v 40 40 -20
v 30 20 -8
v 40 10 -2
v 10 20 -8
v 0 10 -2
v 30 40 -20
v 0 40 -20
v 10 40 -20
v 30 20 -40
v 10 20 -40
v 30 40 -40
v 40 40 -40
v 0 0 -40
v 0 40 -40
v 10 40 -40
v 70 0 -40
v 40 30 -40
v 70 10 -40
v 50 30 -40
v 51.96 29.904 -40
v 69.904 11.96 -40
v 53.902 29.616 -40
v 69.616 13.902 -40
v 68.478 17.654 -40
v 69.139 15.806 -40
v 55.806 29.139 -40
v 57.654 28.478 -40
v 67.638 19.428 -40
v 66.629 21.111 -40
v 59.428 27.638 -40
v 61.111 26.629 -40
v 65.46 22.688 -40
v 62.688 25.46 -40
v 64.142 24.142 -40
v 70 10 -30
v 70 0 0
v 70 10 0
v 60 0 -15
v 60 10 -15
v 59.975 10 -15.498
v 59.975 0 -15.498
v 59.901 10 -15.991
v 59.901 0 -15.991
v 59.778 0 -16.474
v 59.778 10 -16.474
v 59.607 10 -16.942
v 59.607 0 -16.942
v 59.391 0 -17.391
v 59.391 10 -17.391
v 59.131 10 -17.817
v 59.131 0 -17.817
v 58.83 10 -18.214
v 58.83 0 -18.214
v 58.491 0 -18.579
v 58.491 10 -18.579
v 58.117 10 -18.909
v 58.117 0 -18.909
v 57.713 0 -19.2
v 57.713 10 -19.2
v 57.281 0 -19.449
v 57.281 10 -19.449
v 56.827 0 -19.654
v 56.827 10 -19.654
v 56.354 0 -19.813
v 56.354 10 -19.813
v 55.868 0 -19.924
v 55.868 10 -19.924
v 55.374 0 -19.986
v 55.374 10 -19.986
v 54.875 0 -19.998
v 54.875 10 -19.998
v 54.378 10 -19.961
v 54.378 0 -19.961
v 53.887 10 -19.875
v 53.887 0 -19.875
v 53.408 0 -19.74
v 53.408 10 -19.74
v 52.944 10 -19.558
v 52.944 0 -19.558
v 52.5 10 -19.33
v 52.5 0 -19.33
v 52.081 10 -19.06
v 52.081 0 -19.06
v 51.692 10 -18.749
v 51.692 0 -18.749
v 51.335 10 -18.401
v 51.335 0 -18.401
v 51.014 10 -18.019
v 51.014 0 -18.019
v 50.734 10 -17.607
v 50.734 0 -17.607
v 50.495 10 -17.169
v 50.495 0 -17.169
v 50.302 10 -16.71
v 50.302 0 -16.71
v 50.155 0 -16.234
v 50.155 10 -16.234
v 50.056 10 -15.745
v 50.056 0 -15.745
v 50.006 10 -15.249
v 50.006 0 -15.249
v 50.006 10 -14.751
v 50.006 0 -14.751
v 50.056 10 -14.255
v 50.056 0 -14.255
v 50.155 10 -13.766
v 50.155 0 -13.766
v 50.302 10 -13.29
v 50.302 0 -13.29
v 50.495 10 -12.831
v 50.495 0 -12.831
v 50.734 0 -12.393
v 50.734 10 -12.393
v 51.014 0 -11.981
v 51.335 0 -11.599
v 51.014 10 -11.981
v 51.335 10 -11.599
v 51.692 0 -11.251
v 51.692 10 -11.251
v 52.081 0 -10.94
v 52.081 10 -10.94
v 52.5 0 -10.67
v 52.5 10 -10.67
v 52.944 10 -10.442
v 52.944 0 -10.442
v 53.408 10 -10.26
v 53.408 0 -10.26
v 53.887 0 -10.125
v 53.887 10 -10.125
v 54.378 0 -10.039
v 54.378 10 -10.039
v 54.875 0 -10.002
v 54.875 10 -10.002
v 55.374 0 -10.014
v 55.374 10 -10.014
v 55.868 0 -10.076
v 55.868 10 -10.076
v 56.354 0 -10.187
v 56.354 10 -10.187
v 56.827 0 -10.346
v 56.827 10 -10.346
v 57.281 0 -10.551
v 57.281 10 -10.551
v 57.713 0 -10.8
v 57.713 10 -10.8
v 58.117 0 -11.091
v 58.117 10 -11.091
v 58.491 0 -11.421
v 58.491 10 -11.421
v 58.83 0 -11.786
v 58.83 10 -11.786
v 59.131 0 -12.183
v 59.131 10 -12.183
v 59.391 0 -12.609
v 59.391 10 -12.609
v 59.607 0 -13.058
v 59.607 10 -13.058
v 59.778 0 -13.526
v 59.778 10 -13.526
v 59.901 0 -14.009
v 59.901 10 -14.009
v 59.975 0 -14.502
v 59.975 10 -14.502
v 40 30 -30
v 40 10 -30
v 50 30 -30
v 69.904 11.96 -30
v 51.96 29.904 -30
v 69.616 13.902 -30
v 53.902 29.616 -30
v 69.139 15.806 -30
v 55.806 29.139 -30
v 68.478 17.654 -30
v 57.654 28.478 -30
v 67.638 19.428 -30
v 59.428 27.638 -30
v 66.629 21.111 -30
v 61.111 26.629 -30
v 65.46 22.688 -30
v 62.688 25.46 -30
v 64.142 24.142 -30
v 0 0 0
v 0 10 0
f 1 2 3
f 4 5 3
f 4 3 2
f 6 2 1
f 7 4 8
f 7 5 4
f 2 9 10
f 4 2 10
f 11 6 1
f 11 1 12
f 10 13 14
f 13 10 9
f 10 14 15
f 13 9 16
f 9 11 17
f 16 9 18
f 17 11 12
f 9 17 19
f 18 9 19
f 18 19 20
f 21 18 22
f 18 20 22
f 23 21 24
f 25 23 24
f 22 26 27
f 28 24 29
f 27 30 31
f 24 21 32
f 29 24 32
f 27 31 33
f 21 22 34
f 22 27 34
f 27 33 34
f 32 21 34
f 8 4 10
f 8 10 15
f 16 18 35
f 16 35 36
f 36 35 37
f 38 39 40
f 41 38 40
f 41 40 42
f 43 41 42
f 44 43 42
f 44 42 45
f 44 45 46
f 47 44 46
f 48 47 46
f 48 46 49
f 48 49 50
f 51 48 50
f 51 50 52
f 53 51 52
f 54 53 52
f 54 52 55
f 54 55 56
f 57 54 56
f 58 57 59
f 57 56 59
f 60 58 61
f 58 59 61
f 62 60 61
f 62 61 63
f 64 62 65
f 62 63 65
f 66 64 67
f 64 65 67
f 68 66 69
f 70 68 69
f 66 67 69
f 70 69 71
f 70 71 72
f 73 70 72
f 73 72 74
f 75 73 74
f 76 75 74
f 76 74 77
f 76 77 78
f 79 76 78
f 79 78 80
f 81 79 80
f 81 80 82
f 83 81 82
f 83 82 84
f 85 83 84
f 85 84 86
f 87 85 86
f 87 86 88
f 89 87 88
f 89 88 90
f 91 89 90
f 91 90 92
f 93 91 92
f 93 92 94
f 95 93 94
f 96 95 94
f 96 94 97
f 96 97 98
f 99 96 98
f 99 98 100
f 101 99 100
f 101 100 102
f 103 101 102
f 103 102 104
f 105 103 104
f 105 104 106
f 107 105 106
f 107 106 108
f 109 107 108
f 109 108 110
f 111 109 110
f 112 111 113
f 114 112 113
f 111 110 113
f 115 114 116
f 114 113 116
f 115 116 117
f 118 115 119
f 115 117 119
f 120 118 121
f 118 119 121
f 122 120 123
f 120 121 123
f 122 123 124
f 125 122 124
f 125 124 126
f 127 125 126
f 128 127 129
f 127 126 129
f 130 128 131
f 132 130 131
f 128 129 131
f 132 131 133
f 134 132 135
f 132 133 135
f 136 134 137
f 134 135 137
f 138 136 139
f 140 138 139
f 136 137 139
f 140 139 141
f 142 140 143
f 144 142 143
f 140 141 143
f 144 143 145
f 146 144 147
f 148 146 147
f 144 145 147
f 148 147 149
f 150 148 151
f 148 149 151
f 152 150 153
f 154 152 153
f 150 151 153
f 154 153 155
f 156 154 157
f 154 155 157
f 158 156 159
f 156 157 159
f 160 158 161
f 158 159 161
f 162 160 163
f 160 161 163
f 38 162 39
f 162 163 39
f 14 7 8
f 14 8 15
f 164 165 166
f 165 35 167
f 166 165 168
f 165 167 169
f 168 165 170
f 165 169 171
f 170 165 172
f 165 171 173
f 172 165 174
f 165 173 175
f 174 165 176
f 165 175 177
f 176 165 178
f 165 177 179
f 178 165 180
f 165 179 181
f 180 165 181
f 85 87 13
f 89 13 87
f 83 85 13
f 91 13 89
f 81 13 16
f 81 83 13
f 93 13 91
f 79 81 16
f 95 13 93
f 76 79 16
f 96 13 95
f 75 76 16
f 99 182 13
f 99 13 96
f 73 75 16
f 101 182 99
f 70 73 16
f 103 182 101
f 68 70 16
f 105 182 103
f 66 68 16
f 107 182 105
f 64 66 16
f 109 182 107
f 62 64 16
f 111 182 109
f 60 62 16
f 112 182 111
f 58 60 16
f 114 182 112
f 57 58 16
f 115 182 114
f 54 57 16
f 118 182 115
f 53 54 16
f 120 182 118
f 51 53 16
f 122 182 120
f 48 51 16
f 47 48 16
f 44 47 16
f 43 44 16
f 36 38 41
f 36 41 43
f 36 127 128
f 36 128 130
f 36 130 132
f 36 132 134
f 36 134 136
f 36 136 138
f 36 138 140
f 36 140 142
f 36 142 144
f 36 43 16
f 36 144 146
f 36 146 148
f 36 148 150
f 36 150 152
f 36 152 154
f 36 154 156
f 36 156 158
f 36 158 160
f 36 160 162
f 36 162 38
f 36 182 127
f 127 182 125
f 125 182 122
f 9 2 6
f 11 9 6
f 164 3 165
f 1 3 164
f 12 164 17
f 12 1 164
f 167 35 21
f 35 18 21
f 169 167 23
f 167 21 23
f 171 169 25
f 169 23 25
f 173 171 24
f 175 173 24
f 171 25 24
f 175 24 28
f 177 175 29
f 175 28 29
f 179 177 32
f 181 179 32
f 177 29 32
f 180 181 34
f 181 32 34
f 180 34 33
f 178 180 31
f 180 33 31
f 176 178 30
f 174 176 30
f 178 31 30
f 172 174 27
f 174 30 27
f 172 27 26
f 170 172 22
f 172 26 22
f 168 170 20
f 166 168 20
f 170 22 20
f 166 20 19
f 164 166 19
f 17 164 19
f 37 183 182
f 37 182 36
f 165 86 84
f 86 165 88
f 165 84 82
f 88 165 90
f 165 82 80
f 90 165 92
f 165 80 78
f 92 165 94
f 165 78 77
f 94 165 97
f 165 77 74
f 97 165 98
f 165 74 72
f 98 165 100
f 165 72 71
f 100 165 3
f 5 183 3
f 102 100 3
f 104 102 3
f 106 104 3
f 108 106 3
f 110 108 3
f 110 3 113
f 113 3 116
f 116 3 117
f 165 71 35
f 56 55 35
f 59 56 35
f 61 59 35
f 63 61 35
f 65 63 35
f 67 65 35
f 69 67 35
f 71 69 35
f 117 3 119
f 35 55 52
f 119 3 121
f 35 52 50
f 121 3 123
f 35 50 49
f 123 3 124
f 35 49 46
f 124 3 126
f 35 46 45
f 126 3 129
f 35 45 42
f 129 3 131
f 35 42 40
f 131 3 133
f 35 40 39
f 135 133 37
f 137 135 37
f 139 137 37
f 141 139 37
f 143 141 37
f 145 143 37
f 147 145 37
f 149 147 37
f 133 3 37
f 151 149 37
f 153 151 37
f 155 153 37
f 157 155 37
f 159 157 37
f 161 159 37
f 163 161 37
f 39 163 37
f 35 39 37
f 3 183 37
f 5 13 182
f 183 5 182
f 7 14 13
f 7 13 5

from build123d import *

# Parameters (mm, degrees)
BOSS_EXTRUDE1_DEPTH            = 40
SKETCH2_W                      = 40
SKETCH2_H                      = 30
BOSS_EXTRUDE2_DEPTH            = 20
BOSS_EXTRUDE3_DEPTH            = 30
CUT_EXTRUDE1_DEPTH             = 30
SKETCH5_W                      = 70
SKETCH5_H                      = 40
BOSS_EXTRUDE4_DEPTH            = 10
SKETCH6_W                      = 20
SKETCH6_H                      = 20
CUT_EXTRUDE2_DEPTH             = 41
F_10_0_10_DIAMETER_HOLE1_D     = 10
F_10_0_10_DIAMETER_HOLE1_DEPTH = 40
FILLET1_R                      = 20


with BuildPart() as part:
    # Sketch1 → Boss-Extrude1 (new body)
    with BuildSketch(Plane(origin=(0, 0, 0), x_dir=(0, -1, 0), z_dir=(-1, 0, 0))):
        Polygon((-10, -2), (-40, -20), (-10, -20), align=None)
    extrude(amount=-BOSS_EXTRUDE1_DEPTH)

    # Sketch2 → Boss-Extrude2 (add)
    with BuildSketch(Plane(origin=(0, 0, -20), x_dir=(-1, 0, 0), z_dir=(0, 0, -1))):
        with Locations((-20, 25)):
            Rectangle(SKETCH2_W, SKETCH2_H)
    extrude(amount=BOSS_EXTRUDE2_DEPTH)

    # Sketch3 → Boss-Extrude3 (add)
    with BuildSketch(Plane(origin=(40, 0, 0), x_dir=(0, 0, -1), z_dir=(1, 0, 0))):
        Polygon((40, 10), (0, 10), (20, 40), (40, 40), align=None)
    extrude(amount=BOSS_EXTRUDE3_DEPTH)

    # Sketch4 → Cut-Extrude1 (cut)
    with BuildSketch(Plane(origin=(70, 0, 0), x_dir=(0, 0, -1), z_dir=(1, 0, 0))):
        Polygon((20, 40), (0, 10), (30, 10), (30, 30), (40, 30), (40, 40), align=None)
    extrude(amount=-CUT_EXTRUDE1_DEPTH, mode=Mode.SUBTRACT)

    # Sketch5 → Boss-Extrude4 (add)
    with BuildSketch(Plane.XZ.offset(-10)):
        with Locations((35, -20)):
            Rectangle(SKETCH5_W, SKETCH5_H)
    extrude(amount=BOSS_EXTRUDE4_DEPTH)

    # Sketch6 → Cut-Extrude2 (cut, through all)
    with BuildSketch(Plane(origin=(0, 0, -40), x_dir=(-1, 0, 0), z_dir=(0, 0, -1))):
        with Locations((-20, 30)):
            Rectangle(SKETCH6_W, SKETCH6_H)
    extrude(amount=-CUT_EXTRUDE2_DEPTH, mode=Mode.SUBTRACT)

    # Ø10.0 (10) Diameter Hole1
    with Locations(Plane(origin=(0, 0, 0), x_dir=(-1, 0, 0), z_dir=(0, -1, 0))):
        with Locations((-55, 15)):
            Hole(F_10_0_10_DIAMETER_HOLE1_D / 2, depth=F_10_0_10_DIAMETER_HOLE1_DEPTH)

    # Fillet1
    fillet1_edges = [part.edges().sort_by_distance(p)[0] for p in [
        (70, 30, -35),
    ]]
    fillet(fillet1_edges, radius=FILLET1_R)


solid = part.part
